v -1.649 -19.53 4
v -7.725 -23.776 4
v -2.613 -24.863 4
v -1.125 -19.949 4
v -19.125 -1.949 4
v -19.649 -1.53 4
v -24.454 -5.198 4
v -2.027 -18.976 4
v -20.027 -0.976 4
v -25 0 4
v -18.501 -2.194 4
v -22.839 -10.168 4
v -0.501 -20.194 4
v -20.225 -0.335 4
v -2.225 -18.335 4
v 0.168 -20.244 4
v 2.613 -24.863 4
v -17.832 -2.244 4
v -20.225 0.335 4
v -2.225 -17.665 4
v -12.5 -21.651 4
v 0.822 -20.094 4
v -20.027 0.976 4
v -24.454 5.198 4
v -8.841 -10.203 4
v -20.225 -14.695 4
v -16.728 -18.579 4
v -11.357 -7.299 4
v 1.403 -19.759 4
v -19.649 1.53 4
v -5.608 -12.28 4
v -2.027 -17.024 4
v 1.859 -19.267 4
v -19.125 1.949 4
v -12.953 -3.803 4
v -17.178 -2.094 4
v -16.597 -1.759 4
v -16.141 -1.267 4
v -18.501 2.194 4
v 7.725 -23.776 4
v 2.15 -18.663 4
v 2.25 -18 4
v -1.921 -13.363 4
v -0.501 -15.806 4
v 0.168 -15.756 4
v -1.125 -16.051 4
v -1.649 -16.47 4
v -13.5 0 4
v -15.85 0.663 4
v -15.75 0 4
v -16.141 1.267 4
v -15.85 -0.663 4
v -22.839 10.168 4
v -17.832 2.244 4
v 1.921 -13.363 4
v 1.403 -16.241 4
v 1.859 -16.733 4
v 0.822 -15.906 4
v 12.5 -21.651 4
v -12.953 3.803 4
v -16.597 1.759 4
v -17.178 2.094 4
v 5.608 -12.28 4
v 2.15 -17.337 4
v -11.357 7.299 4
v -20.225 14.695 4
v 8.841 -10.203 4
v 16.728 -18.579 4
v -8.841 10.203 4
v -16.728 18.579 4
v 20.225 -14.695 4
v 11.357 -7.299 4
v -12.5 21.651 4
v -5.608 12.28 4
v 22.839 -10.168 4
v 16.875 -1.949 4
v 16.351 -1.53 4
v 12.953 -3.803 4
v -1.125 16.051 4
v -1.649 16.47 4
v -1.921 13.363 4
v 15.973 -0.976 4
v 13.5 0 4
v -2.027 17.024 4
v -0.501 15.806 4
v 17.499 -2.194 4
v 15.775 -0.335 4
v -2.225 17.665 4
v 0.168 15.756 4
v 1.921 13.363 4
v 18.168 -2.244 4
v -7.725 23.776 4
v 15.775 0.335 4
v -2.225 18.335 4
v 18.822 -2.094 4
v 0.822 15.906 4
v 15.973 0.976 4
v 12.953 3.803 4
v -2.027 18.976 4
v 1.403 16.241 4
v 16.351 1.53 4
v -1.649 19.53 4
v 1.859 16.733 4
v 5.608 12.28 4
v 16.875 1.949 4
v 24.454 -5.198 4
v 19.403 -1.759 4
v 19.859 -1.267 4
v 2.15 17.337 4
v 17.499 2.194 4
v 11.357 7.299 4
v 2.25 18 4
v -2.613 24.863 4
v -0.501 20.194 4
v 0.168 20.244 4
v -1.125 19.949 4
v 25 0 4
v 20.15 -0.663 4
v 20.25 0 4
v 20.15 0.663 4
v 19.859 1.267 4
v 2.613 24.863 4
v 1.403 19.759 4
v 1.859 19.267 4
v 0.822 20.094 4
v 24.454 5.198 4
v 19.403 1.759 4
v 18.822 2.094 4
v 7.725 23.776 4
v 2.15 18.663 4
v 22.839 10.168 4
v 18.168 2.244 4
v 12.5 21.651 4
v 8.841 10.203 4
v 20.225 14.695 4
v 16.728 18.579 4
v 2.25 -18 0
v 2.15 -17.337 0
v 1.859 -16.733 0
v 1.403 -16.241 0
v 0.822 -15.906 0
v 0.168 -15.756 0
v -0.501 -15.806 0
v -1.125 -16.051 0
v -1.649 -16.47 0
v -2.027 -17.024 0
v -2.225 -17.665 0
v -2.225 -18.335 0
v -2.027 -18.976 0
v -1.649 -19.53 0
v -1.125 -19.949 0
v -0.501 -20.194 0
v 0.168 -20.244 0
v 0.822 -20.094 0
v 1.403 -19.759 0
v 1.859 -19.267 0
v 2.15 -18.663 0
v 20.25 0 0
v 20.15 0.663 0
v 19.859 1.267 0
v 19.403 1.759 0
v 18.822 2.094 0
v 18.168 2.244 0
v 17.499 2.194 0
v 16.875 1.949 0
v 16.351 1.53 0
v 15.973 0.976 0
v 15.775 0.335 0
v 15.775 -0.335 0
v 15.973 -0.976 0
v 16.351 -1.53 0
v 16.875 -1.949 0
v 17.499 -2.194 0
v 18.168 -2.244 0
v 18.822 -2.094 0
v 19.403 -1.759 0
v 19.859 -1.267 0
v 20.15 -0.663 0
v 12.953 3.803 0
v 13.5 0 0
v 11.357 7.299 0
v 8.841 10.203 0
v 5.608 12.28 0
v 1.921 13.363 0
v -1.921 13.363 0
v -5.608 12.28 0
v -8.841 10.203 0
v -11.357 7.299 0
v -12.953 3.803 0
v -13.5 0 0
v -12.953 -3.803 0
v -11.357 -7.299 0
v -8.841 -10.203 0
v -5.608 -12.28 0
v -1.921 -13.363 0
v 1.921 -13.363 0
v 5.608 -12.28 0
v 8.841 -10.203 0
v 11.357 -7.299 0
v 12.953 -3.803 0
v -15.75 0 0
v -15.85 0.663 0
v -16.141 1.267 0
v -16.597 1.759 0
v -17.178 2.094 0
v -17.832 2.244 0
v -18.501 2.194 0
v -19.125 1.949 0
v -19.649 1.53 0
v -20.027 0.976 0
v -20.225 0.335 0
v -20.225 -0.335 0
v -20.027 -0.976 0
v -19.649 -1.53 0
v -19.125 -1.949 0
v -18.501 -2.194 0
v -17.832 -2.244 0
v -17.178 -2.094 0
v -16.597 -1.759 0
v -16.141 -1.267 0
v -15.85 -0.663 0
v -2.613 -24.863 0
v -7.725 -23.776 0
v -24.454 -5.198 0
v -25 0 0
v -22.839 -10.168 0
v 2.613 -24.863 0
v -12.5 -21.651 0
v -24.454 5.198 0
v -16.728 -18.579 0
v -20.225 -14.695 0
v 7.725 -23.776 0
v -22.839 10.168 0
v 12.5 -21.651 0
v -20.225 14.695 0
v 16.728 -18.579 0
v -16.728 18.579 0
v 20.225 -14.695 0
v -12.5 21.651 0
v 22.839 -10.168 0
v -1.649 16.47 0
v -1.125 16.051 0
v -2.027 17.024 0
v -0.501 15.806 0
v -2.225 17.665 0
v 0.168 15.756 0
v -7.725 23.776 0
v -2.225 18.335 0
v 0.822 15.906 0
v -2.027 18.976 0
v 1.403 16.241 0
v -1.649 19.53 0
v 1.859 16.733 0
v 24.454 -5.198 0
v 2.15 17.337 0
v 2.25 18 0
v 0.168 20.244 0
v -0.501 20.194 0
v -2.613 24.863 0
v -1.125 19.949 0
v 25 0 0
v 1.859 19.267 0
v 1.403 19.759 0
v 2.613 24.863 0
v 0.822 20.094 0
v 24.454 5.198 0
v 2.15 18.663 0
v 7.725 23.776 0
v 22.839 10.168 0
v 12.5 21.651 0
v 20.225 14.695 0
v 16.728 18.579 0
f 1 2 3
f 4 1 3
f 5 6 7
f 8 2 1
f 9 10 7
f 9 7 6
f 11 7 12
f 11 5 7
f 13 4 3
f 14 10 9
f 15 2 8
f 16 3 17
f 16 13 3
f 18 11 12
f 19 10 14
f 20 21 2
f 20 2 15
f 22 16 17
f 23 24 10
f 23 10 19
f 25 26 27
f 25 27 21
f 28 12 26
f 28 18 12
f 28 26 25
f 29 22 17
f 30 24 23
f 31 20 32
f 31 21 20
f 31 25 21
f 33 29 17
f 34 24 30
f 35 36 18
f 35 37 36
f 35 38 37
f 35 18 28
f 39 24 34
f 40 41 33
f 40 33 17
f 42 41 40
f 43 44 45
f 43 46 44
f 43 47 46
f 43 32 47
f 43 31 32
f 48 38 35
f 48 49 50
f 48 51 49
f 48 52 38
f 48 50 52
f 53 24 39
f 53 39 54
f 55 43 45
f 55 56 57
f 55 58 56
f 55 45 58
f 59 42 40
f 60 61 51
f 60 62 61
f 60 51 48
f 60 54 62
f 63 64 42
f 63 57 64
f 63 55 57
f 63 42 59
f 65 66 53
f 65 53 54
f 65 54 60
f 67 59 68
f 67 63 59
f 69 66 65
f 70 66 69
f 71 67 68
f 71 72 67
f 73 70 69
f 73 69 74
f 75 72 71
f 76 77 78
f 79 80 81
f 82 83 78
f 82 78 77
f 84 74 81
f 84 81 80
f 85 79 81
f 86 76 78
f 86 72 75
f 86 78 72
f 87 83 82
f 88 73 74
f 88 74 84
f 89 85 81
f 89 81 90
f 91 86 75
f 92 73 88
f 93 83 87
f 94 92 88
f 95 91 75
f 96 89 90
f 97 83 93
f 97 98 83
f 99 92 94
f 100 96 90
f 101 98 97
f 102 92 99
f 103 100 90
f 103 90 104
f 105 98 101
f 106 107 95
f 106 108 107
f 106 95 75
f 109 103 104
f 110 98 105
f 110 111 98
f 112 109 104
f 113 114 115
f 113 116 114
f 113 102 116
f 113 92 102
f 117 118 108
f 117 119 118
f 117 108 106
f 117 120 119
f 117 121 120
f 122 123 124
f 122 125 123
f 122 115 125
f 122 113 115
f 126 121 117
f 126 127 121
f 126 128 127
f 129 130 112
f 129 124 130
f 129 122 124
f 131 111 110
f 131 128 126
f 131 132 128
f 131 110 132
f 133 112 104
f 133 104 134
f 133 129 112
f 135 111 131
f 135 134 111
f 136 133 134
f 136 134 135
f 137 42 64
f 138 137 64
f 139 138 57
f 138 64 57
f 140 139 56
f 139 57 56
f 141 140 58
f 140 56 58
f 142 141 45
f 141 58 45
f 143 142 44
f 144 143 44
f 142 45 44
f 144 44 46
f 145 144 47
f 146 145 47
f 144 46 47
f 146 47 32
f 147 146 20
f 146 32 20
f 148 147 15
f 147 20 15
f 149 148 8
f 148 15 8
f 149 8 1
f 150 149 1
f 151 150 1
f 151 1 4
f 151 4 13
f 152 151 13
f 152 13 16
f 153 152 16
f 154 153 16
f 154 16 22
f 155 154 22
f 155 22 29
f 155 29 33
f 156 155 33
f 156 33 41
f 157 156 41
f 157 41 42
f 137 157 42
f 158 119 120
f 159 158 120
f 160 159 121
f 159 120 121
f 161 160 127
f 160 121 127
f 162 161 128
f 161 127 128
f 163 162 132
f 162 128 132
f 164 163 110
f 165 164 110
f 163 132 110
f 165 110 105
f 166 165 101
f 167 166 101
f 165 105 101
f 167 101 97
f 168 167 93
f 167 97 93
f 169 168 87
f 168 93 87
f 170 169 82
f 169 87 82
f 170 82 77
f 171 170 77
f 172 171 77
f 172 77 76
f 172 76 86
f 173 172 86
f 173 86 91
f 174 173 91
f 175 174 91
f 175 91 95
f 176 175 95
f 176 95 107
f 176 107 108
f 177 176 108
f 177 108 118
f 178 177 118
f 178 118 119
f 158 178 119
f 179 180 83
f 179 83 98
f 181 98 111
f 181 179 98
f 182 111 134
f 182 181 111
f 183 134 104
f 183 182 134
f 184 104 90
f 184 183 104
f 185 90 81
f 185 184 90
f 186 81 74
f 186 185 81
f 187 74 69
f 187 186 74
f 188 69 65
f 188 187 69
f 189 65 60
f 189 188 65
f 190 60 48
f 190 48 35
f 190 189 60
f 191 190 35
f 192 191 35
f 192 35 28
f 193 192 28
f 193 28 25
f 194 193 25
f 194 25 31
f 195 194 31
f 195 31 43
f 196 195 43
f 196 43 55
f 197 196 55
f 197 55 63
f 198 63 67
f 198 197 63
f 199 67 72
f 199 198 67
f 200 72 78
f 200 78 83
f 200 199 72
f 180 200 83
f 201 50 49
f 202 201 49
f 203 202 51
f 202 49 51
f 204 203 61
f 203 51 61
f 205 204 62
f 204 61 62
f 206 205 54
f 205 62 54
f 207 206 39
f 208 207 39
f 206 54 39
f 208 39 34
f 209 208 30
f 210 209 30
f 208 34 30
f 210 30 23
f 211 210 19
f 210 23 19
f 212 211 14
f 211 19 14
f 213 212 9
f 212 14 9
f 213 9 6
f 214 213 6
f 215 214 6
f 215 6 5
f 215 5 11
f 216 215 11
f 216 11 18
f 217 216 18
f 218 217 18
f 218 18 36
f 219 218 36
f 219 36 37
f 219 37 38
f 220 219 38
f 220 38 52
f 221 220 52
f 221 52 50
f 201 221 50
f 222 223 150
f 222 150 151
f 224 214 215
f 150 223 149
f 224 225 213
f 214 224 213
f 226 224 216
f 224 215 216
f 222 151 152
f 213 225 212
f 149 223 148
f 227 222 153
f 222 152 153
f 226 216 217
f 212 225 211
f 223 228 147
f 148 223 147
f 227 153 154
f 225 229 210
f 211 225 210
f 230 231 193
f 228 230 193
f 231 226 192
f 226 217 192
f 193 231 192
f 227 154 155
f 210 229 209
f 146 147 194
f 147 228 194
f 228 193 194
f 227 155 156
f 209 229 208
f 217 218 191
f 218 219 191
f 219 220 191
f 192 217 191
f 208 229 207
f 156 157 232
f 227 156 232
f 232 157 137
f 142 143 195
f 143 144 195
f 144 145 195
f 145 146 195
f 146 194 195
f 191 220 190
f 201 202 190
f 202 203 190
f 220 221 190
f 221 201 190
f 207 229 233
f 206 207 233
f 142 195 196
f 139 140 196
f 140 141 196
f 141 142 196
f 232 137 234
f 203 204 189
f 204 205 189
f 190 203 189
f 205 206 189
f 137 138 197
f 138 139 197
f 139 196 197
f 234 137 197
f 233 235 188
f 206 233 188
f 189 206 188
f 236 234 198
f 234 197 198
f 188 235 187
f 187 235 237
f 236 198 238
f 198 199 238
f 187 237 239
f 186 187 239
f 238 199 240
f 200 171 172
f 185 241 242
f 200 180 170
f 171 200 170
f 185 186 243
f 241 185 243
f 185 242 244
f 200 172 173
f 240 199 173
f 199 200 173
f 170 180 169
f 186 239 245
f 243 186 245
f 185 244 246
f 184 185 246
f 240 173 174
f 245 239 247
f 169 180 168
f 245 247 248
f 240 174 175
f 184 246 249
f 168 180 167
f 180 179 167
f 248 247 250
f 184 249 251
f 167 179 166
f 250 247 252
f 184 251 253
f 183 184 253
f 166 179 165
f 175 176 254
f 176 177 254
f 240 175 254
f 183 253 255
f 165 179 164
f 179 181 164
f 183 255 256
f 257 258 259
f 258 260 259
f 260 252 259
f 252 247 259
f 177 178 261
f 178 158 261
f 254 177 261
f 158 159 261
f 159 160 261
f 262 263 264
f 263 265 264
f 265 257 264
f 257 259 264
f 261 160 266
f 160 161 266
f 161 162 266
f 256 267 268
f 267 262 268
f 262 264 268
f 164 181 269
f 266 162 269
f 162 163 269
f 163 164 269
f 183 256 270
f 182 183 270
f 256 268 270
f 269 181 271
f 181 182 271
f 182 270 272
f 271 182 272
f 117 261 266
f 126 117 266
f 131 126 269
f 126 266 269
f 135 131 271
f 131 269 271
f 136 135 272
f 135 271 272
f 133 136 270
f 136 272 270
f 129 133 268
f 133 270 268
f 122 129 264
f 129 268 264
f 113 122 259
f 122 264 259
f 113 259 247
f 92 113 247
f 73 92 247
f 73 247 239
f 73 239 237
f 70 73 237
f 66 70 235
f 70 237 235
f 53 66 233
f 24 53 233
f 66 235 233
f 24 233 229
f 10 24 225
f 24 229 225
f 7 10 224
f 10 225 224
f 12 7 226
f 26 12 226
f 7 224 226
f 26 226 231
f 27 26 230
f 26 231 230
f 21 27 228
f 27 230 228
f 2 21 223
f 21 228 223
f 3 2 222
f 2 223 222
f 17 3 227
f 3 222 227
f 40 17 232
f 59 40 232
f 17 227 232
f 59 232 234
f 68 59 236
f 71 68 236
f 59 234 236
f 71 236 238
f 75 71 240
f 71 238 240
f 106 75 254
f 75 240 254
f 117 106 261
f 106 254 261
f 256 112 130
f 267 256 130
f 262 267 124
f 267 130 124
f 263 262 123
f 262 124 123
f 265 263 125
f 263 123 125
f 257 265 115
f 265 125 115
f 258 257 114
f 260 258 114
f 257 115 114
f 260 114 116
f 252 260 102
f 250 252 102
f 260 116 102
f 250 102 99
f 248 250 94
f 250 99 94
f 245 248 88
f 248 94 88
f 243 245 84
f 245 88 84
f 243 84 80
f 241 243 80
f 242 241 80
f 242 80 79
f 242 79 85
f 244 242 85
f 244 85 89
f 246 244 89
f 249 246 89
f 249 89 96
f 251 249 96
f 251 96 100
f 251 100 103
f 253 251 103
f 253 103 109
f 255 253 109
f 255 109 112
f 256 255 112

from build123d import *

# Parameters (mm, degrees)
SKETCH1_R           = 25
SKETCH1_R_2         = 13.5
BOSS_EXTRUDE1_DEPTH = 4
SKETCH2_R           = 2.25
CUT_EXTRUDE1_DEPTH  = 5


with BuildPart() as part:
    # Sketch1 → Boss-Extrude1 (new body)
    with BuildSketch(Plane.XY):
        Circle(SKETCH1_R)
        Circle(SKETCH1_R_2, mode=Mode.SUBTRACT)
    extrude(amount=BOSS_EXTRUDE1_DEPTH)

    # Sketch2 → Cut-Extrude1 (cut, through all)
    with BuildSketch(Plane.XY.offset(4)):
        with Locations((0, 18)):
            Circle(SKETCH2_R)
        with Locations((18, 0)):
            Circle(SKETCH2_R)
        with Locations((0, -18)):
            Circle(SKETCH2_R)
        with Locations((-18, 0)):
            Circle(SKETCH2_R)
    extrude(amount=-CUT_EXTRUDE1_DEPTH, mode=Mode.SUBTRACT)


solid = part.part
